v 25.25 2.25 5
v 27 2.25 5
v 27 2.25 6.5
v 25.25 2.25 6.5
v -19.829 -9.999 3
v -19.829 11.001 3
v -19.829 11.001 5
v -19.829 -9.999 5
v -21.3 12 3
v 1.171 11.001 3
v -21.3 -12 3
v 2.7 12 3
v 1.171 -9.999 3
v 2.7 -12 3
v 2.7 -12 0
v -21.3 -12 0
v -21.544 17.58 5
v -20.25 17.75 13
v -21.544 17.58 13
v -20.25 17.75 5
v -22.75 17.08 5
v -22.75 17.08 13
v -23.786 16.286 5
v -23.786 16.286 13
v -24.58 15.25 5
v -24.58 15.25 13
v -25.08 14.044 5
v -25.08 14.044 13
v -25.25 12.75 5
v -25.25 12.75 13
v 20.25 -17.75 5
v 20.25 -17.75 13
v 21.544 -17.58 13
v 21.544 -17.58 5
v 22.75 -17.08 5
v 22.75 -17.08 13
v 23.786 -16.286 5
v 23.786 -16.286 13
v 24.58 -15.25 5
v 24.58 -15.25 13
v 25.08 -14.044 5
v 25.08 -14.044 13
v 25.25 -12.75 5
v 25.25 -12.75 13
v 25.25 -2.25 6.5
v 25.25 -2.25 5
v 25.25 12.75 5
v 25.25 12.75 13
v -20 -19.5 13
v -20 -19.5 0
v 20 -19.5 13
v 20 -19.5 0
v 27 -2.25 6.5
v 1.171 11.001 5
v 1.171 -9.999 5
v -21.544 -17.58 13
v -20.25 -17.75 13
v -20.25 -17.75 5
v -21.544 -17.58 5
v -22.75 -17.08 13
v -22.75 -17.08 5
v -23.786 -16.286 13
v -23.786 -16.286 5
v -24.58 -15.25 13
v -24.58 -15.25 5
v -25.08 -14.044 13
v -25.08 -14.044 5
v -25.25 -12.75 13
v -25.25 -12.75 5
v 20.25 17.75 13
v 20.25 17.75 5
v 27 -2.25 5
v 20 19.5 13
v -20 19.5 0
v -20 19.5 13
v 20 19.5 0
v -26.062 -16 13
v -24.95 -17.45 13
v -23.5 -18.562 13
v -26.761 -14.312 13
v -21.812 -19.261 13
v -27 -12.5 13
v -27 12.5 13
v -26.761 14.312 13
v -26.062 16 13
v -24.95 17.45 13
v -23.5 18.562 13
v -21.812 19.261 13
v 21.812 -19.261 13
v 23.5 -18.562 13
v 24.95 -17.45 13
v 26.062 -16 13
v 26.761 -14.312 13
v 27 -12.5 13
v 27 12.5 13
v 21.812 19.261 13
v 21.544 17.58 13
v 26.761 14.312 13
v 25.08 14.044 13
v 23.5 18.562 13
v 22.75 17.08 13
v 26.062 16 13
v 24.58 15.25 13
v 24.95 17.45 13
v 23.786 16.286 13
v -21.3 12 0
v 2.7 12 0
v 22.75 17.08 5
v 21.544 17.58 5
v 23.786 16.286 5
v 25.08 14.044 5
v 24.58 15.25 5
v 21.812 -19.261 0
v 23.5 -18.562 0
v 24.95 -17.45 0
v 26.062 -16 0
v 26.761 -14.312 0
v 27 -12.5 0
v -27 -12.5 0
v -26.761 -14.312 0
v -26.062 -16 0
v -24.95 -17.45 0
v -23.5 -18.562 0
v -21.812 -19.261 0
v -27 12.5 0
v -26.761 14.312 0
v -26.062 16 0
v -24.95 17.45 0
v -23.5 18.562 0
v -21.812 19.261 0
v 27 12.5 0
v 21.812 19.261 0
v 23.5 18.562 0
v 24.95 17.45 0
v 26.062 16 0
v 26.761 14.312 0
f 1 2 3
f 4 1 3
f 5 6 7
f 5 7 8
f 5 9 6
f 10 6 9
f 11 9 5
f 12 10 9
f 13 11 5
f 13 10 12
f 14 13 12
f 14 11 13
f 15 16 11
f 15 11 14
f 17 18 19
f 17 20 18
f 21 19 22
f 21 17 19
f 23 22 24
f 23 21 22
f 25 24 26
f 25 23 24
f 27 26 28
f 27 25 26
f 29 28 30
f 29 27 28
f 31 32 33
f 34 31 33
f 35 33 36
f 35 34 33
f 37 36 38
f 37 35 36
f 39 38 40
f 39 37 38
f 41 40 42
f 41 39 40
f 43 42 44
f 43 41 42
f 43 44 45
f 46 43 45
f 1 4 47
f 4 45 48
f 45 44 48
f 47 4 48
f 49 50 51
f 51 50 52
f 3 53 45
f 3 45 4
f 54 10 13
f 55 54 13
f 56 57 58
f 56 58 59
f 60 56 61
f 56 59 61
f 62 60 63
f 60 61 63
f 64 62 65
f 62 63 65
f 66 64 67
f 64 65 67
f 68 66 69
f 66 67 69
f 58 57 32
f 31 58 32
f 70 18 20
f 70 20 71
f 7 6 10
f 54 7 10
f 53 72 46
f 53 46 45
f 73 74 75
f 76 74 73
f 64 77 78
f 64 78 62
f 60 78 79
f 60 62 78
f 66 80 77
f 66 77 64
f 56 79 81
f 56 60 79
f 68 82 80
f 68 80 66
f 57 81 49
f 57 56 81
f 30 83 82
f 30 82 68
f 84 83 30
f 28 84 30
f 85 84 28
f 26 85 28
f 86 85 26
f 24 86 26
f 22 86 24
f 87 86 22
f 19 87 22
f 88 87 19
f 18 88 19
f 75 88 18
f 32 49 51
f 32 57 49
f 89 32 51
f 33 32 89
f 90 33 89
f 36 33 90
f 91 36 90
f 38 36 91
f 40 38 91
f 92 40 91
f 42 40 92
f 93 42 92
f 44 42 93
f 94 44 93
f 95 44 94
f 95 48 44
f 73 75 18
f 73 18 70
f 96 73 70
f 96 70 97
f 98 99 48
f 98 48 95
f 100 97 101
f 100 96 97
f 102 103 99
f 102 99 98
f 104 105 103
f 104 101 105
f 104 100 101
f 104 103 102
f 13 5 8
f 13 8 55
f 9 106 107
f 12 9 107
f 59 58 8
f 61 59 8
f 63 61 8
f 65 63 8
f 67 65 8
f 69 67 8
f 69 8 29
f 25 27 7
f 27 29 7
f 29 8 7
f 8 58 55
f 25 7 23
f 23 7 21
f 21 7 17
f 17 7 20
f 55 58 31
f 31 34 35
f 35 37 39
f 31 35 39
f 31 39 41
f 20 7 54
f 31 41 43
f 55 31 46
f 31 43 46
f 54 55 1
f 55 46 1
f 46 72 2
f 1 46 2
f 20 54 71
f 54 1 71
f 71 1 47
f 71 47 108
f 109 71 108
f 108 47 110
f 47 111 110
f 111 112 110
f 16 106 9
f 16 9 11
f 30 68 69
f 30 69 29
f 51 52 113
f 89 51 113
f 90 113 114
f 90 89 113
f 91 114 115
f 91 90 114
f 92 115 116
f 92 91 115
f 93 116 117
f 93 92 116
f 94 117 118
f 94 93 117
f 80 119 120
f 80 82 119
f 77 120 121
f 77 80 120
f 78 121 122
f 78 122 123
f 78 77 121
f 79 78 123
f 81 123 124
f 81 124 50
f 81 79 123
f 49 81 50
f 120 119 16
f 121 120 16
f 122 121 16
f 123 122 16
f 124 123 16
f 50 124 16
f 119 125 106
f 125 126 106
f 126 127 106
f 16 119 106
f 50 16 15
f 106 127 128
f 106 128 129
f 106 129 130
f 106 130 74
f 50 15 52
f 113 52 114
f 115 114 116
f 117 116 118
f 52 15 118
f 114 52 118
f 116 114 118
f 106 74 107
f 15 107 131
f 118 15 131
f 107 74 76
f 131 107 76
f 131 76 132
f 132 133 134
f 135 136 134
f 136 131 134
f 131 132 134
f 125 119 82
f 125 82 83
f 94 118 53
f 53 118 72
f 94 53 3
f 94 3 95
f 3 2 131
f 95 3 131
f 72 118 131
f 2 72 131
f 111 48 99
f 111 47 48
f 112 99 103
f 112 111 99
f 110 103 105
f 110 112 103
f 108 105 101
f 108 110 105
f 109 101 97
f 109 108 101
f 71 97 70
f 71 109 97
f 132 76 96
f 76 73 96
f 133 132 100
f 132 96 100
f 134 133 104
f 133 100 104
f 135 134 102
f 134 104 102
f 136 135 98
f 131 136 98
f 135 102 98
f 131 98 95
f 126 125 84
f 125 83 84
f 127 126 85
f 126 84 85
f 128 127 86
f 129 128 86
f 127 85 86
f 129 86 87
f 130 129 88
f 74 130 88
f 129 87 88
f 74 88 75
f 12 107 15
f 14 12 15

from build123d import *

# Parameters (mm, degrees)
F0_W      = 54
F0_H      = 39
F1_DEPTH  = 13
F2_W      = 50.5
F2_H      = 35.5
F3_DEPTH  = 8
F4_W      = 24
F4_H      = 24
F5_DEPTH  = 3
F6_W      = 21
F6_H      = 21
F7_DEPTH  = 2
F8_R      = 5
F9_R      = 7
F10_W     = 4.5
F10_H     = 1.5
F11_DEPTH = 1.75


with BuildPart() as f1:
    # F0 (on Top) → F1 (new body)
    with BuildSketch(Plane.XY):
        Rectangle(F0_W, F0_H)
    extrude(amount=F1_DEPTH)

    # F2 (on face) → F3 (cut)
    with BuildSketch(Plane.XY.offset(13)):
        Rectangle(F2_W, F2_H)
    extrude(amount=-F3_DEPTH, mode=Mode.SUBTRACT)

    # F4 (on face) → F5 (cut)
    with BuildSketch(Plane(origin=(0, 0, 0), x_dir=(1, 0, 0), z_dir=(0, 0, -1))):
        with Locations((-9.3, 0)):
            Rectangle(F4_W, F4_H)
    extrude(amount=-F5_DEPTH, mode=Mode.SUBTRACT)

    # F6 (on face) → F7 (cut)
    with BuildSketch(Plane(origin=(0, 0, 3), x_dir=(1, 0, 0), z_dir=(0, 0, -1))):
        with Locations((-9.329, -0.501032)):
            Rectangle(F6_W, F6_H)
    extrude(amount=-F7_DEPTH, mode=Mode.SUBTRACT)

    # F8
    f8_edges = [f1.edges().sort_by_distance(p)[0] for p in [
        (-25.25, 17.75, 9),
        (25.25, 17.75, 9),
        (-25.25, -17.75, 9),
        (25.25, -17.75, 9),
    ]]
    fillet(f8_edges, radius=F8_R)

    # F9
    f9_edges = [f1.edges().sort_by_distance(p)[0] for p in [
        (-27, 19.5, 6.5),
        (-27, -19.5, 6.5),
        (27, 19.5, 6.5),
        (27, -19.5, 6.5),
    ]]
    fillet(f9_edges, radius=F9_R)

    # F10 (on face) → F11 (cut)
    with BuildSketch(Plane.YZ.offset(27)):
        with Locations((0, 5.75)):
            Rectangle(F10_W, F10_H)
    extrude(amount=-F11_DEPTH, mode=Mode.SUBTRACT)


solid = f1.part
